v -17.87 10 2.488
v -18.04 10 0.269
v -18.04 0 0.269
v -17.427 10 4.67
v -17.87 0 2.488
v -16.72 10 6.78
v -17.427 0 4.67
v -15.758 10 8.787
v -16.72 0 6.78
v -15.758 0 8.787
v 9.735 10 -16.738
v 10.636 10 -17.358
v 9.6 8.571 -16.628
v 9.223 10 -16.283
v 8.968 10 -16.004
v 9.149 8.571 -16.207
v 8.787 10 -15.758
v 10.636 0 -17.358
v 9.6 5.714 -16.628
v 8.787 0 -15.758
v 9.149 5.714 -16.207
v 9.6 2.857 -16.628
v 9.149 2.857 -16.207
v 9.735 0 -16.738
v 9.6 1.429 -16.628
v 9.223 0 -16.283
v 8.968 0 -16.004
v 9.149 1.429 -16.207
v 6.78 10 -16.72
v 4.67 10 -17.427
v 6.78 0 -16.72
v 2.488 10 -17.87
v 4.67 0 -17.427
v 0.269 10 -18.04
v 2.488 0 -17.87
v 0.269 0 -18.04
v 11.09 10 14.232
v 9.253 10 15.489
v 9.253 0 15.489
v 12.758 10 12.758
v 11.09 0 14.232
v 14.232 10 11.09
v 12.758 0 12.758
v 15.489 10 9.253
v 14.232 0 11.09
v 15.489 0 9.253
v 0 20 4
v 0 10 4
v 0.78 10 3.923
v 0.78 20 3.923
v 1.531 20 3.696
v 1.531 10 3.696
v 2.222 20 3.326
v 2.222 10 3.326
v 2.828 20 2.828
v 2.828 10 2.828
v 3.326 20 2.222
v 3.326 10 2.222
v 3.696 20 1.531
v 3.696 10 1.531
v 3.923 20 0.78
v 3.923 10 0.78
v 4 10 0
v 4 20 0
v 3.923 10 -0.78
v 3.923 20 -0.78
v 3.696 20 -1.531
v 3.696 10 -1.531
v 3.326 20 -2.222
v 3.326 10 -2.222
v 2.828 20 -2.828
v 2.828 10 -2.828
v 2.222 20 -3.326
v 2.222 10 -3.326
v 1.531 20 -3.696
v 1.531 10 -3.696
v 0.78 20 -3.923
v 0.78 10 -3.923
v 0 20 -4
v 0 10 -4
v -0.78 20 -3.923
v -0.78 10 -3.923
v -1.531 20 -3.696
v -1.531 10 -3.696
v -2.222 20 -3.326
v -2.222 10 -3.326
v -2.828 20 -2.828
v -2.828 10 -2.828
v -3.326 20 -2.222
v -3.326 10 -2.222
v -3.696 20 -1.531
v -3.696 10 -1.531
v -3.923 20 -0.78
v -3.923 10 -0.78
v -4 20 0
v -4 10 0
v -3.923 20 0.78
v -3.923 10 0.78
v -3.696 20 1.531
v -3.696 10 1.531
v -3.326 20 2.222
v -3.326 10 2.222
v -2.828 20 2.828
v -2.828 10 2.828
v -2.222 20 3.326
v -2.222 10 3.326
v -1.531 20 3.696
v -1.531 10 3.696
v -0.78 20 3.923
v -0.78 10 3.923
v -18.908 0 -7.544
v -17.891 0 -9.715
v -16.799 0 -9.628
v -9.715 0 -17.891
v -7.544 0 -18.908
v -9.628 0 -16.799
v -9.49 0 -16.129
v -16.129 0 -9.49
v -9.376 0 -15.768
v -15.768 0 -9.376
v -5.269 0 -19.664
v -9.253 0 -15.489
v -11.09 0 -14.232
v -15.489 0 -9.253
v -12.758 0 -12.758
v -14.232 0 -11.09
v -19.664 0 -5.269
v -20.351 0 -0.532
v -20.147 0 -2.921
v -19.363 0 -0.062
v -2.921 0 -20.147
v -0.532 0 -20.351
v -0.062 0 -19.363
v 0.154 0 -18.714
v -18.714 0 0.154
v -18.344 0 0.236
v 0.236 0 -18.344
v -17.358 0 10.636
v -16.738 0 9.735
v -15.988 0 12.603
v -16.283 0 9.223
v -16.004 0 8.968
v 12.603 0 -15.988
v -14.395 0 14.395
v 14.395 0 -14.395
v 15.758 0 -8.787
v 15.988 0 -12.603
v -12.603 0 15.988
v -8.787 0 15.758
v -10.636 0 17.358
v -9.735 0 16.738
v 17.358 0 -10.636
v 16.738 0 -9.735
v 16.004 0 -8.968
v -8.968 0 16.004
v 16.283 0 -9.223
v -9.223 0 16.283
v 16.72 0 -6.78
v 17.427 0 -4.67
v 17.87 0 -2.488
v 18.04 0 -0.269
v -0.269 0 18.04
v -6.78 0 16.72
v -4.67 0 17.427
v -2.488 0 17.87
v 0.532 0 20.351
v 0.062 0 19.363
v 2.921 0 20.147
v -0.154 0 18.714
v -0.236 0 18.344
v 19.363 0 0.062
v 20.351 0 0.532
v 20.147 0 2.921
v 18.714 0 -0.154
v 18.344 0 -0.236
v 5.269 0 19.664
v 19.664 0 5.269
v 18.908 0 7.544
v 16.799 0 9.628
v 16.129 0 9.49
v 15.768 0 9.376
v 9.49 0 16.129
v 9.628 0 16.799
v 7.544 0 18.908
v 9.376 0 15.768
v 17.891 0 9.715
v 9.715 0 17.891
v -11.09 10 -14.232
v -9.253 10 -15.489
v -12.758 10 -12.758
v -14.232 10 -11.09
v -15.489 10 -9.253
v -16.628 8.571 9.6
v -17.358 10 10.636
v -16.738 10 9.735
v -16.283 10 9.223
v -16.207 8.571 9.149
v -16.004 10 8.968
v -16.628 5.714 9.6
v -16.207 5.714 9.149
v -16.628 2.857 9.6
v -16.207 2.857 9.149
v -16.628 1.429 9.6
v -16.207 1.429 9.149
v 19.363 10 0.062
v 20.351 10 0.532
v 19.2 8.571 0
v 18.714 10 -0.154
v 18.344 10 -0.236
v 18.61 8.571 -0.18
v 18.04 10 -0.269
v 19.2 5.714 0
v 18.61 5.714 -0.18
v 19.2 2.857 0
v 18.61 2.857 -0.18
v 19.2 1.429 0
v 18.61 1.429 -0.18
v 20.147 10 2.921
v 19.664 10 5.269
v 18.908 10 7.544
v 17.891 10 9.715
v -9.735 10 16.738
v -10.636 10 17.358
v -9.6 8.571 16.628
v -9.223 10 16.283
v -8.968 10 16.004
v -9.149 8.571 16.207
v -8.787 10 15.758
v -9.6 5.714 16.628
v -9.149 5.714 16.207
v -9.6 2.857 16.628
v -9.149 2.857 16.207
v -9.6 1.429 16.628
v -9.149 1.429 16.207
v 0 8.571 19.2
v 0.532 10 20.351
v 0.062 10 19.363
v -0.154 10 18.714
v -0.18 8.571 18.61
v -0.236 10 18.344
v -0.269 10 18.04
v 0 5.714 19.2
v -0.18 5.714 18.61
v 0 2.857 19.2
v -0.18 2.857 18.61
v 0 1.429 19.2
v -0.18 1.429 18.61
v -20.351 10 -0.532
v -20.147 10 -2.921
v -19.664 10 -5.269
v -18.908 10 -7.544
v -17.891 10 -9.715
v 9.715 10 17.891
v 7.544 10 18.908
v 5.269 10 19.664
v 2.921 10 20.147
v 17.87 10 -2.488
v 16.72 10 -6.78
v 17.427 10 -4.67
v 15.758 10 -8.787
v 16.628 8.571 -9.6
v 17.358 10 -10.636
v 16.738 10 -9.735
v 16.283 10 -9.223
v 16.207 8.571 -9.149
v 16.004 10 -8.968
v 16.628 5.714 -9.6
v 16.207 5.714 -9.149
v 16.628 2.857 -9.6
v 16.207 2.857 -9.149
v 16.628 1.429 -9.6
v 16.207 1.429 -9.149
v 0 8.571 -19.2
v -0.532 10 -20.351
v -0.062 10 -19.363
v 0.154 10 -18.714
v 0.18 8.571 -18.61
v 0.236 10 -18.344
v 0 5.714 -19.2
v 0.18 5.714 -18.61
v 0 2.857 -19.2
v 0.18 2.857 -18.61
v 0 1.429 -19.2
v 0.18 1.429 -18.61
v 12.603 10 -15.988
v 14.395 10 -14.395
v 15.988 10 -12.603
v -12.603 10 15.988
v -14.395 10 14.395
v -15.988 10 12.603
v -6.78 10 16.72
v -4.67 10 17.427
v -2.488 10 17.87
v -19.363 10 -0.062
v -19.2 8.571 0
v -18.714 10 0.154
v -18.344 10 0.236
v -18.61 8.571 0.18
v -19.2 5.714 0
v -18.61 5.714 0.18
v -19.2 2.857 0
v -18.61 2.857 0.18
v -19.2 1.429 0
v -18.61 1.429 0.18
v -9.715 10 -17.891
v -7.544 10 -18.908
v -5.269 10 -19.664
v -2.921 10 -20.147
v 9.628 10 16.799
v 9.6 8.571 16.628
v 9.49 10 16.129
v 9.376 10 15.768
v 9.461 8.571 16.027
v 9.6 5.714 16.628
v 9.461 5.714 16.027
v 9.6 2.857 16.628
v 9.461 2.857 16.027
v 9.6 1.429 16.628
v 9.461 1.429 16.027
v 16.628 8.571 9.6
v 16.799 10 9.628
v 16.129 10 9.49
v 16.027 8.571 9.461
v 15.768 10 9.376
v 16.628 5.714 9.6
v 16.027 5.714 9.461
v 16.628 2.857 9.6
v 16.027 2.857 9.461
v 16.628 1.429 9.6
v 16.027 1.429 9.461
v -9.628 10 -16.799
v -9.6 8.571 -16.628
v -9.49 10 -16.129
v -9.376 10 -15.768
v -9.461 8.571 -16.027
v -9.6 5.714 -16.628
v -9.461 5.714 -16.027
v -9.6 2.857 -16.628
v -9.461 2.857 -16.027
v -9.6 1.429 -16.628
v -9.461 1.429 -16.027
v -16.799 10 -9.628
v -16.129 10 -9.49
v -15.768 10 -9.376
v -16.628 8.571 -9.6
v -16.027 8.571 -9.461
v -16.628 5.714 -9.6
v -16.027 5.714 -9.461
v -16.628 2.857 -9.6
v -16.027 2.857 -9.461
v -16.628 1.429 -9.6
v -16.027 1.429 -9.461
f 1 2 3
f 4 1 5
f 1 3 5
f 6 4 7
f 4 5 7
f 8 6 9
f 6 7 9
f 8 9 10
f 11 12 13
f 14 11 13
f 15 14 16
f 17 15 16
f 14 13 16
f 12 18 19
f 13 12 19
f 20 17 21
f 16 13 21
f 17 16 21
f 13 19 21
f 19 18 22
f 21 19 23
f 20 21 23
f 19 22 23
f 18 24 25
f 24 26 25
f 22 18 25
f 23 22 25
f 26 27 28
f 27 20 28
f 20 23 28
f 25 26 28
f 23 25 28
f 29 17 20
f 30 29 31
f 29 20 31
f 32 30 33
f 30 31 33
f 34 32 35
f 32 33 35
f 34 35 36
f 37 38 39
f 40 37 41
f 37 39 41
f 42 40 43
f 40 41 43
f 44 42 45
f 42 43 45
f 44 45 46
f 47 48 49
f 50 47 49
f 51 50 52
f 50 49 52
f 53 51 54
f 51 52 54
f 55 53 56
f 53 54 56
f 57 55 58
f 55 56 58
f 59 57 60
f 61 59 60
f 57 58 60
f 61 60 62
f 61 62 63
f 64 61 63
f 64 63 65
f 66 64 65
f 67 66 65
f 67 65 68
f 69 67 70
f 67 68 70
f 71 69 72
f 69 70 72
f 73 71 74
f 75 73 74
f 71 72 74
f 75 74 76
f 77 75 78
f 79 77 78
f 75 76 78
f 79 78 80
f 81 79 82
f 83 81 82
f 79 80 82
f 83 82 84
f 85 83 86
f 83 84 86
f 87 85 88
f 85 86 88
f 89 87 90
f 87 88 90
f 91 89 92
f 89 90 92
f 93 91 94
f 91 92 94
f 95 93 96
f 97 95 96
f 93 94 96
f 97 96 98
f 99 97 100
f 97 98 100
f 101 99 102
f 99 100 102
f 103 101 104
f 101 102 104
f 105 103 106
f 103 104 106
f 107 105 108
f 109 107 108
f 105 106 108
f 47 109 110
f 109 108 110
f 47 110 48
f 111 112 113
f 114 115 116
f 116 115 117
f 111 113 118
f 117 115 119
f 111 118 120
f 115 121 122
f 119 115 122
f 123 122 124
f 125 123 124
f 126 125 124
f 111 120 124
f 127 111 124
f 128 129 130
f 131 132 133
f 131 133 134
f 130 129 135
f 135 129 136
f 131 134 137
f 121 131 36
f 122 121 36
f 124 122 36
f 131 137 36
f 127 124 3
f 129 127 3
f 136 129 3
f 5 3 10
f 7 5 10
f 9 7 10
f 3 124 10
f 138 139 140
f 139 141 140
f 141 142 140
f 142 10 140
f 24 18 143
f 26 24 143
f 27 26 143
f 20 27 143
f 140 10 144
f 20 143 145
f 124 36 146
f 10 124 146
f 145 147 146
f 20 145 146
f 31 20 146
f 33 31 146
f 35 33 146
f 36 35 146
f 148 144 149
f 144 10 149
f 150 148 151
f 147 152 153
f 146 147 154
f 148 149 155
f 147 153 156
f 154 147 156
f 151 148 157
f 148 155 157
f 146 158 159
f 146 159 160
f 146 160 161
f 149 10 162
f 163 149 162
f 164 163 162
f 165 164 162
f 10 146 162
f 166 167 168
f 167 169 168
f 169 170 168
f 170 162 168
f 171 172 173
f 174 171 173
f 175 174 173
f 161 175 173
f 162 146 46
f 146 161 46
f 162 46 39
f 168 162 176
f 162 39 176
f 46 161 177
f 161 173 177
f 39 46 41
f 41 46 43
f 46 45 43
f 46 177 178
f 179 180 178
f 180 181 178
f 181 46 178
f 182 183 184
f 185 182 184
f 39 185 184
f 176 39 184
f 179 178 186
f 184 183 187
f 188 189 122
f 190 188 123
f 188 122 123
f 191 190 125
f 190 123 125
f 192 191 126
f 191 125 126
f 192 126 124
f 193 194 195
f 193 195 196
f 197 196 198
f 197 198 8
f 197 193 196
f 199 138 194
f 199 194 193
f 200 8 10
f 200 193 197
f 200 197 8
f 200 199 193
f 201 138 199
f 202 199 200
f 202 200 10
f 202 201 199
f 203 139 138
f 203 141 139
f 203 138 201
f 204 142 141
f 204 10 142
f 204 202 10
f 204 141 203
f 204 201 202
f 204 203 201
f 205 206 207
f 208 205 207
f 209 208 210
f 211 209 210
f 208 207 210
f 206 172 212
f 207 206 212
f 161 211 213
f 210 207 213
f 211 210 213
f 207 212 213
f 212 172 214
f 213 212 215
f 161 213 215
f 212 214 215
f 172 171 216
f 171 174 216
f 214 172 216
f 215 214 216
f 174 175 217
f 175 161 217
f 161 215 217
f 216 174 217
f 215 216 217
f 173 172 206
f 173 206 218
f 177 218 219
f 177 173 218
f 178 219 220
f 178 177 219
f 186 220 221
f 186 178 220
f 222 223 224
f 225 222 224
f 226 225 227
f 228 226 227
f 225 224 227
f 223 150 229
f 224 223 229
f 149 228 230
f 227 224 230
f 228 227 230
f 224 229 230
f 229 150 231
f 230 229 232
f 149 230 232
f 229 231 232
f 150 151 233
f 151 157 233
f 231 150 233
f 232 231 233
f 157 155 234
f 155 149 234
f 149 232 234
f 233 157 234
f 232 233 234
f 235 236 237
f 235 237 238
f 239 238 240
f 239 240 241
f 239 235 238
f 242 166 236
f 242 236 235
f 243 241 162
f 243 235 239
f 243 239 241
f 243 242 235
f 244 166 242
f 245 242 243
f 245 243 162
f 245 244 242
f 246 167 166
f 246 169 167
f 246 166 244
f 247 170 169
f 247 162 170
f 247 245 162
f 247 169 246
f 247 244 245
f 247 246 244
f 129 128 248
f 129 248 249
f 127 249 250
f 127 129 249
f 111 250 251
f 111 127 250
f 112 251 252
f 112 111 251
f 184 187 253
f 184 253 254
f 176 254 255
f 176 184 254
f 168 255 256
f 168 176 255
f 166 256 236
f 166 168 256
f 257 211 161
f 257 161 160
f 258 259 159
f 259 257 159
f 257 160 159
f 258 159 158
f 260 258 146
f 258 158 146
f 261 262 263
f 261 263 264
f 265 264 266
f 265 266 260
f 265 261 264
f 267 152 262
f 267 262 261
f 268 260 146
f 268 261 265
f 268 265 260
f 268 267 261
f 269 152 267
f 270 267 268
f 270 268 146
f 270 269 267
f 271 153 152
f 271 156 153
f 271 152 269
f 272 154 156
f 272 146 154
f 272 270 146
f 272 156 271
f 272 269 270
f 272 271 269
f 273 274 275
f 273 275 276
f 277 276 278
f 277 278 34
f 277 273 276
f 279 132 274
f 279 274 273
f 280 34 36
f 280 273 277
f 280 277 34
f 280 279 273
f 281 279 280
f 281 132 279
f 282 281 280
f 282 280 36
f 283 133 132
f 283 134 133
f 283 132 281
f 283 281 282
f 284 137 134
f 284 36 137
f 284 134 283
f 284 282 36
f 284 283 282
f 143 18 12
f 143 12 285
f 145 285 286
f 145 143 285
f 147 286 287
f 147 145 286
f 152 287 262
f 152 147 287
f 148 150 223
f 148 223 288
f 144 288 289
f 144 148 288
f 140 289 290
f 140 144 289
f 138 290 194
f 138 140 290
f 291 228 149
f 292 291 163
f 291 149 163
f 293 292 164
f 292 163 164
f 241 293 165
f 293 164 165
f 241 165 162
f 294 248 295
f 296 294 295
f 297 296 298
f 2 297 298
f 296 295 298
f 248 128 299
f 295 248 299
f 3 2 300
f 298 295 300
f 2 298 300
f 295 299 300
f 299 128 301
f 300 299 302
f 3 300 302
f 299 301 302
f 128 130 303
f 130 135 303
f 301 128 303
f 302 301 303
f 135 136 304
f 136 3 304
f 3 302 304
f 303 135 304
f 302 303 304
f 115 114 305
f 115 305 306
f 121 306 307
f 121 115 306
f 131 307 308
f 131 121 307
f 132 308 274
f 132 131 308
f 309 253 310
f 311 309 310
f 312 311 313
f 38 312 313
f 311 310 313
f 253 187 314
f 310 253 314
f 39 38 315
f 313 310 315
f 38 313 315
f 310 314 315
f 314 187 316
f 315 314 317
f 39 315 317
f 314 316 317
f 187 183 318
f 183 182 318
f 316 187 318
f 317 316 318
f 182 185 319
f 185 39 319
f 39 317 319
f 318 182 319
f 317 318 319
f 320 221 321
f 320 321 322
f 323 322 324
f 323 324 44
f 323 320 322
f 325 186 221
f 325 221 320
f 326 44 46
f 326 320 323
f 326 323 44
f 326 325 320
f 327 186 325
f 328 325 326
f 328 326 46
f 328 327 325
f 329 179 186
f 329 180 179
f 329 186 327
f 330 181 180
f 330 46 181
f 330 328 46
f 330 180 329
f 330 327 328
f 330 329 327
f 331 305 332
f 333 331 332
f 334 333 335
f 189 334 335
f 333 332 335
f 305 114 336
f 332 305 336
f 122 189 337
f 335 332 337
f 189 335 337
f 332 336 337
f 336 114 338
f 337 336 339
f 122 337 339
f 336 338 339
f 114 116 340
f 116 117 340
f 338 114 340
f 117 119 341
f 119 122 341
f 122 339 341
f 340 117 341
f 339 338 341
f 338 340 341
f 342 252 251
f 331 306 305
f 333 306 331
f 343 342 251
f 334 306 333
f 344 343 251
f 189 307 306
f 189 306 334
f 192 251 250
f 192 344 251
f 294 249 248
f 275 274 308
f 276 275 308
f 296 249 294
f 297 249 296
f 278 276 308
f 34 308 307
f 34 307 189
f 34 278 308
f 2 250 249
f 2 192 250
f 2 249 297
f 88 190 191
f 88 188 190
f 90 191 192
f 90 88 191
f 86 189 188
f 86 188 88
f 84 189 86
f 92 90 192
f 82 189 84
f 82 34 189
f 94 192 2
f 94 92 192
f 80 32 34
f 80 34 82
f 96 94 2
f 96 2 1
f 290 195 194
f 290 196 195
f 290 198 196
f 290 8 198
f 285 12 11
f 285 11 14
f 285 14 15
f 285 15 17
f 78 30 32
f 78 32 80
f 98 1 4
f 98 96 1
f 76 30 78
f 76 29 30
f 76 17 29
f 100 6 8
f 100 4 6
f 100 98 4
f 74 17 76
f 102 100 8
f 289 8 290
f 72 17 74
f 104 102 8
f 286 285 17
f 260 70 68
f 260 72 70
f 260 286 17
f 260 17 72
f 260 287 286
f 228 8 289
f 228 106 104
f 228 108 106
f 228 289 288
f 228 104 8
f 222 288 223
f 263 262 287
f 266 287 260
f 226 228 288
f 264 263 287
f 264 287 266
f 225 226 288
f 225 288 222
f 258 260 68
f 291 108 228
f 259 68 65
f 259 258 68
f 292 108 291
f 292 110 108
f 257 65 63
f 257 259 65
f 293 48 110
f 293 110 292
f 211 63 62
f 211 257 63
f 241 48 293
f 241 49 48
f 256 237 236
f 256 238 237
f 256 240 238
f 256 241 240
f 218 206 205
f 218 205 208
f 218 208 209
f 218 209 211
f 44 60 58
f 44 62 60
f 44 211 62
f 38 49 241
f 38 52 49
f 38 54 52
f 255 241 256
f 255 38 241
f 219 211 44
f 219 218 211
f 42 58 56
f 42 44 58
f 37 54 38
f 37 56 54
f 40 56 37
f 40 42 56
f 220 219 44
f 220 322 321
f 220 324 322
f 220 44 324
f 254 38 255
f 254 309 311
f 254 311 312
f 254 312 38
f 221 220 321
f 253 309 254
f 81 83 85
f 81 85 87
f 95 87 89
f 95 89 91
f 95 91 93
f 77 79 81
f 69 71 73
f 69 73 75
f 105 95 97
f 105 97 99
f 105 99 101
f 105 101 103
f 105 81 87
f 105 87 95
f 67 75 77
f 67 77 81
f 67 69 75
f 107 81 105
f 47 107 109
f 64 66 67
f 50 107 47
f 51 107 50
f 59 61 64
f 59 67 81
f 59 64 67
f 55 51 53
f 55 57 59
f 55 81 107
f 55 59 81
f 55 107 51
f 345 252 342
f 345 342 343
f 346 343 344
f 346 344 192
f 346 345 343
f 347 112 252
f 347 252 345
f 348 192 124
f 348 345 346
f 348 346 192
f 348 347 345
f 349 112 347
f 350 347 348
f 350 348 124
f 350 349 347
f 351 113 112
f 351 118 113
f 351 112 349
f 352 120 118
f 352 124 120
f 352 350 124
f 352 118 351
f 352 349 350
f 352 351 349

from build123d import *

# Parameters (mm, degrees)
SKETCH_1_R               = 18.042098319
EXTRUDE_1_DEPTH          = 10
EXTRUDE_2_DEPTH          = 10
PATTERN_CIRCULAR_1_COUNT = 6
SKETCH_5_R               = 4
EXTRUDE_3_DEPTH          = 10


with BuildPart() as part:
    # ｽｹｯﾁ1 → ﾎﾞｽ - 押し出し1 (new body)
    with BuildSketch(Plane(origin=(0, 0, 0), x_dir=(1, 0, 0), z_dir=(0, 1, 0))):
        with Locations(Location((0, 0, 0), (0, 0, 270))):
            Circle(SKETCH_1_R)
    extrude(amount=EXTRUDE_1_DEPTH)

    # ｽｹｯﾁ4 → ﾎﾞｽ - 押し出し2 (add)
    with BuildSketch(Plane(origin=(0, 0, 0), x_dir=(1, 0, 0), z_dir=(0, 1, 0))):
        with BuildLine():
            ThreePointArc((0.268896403, 18.040094414), (-4.669638659, 17.427328727), (-9.252918324, 15.488731848))
            add(Edge.make_bspline(
                [(-9.714533079, 17.890556389), (-9.709818433, 17.598094858), (-9.683773216, 17.175123253), (-9.606482839, 16.645312354), (-9.53966415, 16.315628537), (-9.468789573, 16.043783597), (-9.40010103, 15.828997964), (-9.331330572, 15.648985933), (-9.28257301, 15.54191839), (-9.252918324, 15.488731848)],
                knots=[0, 0, 0, 0, 0.356146416, 0.515080655, 0.651524593, 0.765478231, 0.856941573, 0.925914628, 1, 1, 1, 1], degree=3))
            ThreePointArc((-9.714533079, 17.890556389), (-5.269012673, 19.664223003), (-0.532245762, 20.35094286))
            add(Edge.make_bspline(
                [(-0.532245762, 20.35094286), (-0.390098, 20.095306422), (-0.201168016, 19.715979658), (-0.003197997, 19.218504772), (0.103777229, 18.899580866), (0.178320514, 18.628718954), (0.226227308, 18.408364869), (0.25667636, 18.218084648), (0.267984844, 18.100982654), (0.268896403, 18.040094414)],
                knots=[0, 0, 0, 0, 0.356146416, 0.515080655, 0.651524593, 0.765478231, 0.856941573, 0.925914628, 1, 1, 1, 1], degree=3))
        make_face()
    extrude_2 = extrude(amount=EXTRUDE_2_DEPTH)

    # 円形ﾊﾟﾀｰﾝ1: ﾎﾞｽ - 押し出し2 ×6 about axis
    pattern_circular_1_axis = Axis((0, 10, 0), (0, 1, 0))
    for i in range(1, PATTERN_CIRCULAR_1_COUNT):
        add(extrude_2.rotate(pattern_circular_1_axis, i * 360 / PATTERN_CIRCULAR_1_COUNT))

    # ｽｹｯﾁ5 → ﾎﾞｽ - 押し出し3 (add)
    with BuildSketch(Plane(origin=(0, 10, 0), x_dir=(1, 0, 0), z_dir=(0, 1, 0))):
        with Locations(Location((0, 0, 0), (0, 0, 270))):
            Circle(SKETCH_5_R)
    extrude(amount=EXTRUDE_3_DEPTH)


solid = part.part
